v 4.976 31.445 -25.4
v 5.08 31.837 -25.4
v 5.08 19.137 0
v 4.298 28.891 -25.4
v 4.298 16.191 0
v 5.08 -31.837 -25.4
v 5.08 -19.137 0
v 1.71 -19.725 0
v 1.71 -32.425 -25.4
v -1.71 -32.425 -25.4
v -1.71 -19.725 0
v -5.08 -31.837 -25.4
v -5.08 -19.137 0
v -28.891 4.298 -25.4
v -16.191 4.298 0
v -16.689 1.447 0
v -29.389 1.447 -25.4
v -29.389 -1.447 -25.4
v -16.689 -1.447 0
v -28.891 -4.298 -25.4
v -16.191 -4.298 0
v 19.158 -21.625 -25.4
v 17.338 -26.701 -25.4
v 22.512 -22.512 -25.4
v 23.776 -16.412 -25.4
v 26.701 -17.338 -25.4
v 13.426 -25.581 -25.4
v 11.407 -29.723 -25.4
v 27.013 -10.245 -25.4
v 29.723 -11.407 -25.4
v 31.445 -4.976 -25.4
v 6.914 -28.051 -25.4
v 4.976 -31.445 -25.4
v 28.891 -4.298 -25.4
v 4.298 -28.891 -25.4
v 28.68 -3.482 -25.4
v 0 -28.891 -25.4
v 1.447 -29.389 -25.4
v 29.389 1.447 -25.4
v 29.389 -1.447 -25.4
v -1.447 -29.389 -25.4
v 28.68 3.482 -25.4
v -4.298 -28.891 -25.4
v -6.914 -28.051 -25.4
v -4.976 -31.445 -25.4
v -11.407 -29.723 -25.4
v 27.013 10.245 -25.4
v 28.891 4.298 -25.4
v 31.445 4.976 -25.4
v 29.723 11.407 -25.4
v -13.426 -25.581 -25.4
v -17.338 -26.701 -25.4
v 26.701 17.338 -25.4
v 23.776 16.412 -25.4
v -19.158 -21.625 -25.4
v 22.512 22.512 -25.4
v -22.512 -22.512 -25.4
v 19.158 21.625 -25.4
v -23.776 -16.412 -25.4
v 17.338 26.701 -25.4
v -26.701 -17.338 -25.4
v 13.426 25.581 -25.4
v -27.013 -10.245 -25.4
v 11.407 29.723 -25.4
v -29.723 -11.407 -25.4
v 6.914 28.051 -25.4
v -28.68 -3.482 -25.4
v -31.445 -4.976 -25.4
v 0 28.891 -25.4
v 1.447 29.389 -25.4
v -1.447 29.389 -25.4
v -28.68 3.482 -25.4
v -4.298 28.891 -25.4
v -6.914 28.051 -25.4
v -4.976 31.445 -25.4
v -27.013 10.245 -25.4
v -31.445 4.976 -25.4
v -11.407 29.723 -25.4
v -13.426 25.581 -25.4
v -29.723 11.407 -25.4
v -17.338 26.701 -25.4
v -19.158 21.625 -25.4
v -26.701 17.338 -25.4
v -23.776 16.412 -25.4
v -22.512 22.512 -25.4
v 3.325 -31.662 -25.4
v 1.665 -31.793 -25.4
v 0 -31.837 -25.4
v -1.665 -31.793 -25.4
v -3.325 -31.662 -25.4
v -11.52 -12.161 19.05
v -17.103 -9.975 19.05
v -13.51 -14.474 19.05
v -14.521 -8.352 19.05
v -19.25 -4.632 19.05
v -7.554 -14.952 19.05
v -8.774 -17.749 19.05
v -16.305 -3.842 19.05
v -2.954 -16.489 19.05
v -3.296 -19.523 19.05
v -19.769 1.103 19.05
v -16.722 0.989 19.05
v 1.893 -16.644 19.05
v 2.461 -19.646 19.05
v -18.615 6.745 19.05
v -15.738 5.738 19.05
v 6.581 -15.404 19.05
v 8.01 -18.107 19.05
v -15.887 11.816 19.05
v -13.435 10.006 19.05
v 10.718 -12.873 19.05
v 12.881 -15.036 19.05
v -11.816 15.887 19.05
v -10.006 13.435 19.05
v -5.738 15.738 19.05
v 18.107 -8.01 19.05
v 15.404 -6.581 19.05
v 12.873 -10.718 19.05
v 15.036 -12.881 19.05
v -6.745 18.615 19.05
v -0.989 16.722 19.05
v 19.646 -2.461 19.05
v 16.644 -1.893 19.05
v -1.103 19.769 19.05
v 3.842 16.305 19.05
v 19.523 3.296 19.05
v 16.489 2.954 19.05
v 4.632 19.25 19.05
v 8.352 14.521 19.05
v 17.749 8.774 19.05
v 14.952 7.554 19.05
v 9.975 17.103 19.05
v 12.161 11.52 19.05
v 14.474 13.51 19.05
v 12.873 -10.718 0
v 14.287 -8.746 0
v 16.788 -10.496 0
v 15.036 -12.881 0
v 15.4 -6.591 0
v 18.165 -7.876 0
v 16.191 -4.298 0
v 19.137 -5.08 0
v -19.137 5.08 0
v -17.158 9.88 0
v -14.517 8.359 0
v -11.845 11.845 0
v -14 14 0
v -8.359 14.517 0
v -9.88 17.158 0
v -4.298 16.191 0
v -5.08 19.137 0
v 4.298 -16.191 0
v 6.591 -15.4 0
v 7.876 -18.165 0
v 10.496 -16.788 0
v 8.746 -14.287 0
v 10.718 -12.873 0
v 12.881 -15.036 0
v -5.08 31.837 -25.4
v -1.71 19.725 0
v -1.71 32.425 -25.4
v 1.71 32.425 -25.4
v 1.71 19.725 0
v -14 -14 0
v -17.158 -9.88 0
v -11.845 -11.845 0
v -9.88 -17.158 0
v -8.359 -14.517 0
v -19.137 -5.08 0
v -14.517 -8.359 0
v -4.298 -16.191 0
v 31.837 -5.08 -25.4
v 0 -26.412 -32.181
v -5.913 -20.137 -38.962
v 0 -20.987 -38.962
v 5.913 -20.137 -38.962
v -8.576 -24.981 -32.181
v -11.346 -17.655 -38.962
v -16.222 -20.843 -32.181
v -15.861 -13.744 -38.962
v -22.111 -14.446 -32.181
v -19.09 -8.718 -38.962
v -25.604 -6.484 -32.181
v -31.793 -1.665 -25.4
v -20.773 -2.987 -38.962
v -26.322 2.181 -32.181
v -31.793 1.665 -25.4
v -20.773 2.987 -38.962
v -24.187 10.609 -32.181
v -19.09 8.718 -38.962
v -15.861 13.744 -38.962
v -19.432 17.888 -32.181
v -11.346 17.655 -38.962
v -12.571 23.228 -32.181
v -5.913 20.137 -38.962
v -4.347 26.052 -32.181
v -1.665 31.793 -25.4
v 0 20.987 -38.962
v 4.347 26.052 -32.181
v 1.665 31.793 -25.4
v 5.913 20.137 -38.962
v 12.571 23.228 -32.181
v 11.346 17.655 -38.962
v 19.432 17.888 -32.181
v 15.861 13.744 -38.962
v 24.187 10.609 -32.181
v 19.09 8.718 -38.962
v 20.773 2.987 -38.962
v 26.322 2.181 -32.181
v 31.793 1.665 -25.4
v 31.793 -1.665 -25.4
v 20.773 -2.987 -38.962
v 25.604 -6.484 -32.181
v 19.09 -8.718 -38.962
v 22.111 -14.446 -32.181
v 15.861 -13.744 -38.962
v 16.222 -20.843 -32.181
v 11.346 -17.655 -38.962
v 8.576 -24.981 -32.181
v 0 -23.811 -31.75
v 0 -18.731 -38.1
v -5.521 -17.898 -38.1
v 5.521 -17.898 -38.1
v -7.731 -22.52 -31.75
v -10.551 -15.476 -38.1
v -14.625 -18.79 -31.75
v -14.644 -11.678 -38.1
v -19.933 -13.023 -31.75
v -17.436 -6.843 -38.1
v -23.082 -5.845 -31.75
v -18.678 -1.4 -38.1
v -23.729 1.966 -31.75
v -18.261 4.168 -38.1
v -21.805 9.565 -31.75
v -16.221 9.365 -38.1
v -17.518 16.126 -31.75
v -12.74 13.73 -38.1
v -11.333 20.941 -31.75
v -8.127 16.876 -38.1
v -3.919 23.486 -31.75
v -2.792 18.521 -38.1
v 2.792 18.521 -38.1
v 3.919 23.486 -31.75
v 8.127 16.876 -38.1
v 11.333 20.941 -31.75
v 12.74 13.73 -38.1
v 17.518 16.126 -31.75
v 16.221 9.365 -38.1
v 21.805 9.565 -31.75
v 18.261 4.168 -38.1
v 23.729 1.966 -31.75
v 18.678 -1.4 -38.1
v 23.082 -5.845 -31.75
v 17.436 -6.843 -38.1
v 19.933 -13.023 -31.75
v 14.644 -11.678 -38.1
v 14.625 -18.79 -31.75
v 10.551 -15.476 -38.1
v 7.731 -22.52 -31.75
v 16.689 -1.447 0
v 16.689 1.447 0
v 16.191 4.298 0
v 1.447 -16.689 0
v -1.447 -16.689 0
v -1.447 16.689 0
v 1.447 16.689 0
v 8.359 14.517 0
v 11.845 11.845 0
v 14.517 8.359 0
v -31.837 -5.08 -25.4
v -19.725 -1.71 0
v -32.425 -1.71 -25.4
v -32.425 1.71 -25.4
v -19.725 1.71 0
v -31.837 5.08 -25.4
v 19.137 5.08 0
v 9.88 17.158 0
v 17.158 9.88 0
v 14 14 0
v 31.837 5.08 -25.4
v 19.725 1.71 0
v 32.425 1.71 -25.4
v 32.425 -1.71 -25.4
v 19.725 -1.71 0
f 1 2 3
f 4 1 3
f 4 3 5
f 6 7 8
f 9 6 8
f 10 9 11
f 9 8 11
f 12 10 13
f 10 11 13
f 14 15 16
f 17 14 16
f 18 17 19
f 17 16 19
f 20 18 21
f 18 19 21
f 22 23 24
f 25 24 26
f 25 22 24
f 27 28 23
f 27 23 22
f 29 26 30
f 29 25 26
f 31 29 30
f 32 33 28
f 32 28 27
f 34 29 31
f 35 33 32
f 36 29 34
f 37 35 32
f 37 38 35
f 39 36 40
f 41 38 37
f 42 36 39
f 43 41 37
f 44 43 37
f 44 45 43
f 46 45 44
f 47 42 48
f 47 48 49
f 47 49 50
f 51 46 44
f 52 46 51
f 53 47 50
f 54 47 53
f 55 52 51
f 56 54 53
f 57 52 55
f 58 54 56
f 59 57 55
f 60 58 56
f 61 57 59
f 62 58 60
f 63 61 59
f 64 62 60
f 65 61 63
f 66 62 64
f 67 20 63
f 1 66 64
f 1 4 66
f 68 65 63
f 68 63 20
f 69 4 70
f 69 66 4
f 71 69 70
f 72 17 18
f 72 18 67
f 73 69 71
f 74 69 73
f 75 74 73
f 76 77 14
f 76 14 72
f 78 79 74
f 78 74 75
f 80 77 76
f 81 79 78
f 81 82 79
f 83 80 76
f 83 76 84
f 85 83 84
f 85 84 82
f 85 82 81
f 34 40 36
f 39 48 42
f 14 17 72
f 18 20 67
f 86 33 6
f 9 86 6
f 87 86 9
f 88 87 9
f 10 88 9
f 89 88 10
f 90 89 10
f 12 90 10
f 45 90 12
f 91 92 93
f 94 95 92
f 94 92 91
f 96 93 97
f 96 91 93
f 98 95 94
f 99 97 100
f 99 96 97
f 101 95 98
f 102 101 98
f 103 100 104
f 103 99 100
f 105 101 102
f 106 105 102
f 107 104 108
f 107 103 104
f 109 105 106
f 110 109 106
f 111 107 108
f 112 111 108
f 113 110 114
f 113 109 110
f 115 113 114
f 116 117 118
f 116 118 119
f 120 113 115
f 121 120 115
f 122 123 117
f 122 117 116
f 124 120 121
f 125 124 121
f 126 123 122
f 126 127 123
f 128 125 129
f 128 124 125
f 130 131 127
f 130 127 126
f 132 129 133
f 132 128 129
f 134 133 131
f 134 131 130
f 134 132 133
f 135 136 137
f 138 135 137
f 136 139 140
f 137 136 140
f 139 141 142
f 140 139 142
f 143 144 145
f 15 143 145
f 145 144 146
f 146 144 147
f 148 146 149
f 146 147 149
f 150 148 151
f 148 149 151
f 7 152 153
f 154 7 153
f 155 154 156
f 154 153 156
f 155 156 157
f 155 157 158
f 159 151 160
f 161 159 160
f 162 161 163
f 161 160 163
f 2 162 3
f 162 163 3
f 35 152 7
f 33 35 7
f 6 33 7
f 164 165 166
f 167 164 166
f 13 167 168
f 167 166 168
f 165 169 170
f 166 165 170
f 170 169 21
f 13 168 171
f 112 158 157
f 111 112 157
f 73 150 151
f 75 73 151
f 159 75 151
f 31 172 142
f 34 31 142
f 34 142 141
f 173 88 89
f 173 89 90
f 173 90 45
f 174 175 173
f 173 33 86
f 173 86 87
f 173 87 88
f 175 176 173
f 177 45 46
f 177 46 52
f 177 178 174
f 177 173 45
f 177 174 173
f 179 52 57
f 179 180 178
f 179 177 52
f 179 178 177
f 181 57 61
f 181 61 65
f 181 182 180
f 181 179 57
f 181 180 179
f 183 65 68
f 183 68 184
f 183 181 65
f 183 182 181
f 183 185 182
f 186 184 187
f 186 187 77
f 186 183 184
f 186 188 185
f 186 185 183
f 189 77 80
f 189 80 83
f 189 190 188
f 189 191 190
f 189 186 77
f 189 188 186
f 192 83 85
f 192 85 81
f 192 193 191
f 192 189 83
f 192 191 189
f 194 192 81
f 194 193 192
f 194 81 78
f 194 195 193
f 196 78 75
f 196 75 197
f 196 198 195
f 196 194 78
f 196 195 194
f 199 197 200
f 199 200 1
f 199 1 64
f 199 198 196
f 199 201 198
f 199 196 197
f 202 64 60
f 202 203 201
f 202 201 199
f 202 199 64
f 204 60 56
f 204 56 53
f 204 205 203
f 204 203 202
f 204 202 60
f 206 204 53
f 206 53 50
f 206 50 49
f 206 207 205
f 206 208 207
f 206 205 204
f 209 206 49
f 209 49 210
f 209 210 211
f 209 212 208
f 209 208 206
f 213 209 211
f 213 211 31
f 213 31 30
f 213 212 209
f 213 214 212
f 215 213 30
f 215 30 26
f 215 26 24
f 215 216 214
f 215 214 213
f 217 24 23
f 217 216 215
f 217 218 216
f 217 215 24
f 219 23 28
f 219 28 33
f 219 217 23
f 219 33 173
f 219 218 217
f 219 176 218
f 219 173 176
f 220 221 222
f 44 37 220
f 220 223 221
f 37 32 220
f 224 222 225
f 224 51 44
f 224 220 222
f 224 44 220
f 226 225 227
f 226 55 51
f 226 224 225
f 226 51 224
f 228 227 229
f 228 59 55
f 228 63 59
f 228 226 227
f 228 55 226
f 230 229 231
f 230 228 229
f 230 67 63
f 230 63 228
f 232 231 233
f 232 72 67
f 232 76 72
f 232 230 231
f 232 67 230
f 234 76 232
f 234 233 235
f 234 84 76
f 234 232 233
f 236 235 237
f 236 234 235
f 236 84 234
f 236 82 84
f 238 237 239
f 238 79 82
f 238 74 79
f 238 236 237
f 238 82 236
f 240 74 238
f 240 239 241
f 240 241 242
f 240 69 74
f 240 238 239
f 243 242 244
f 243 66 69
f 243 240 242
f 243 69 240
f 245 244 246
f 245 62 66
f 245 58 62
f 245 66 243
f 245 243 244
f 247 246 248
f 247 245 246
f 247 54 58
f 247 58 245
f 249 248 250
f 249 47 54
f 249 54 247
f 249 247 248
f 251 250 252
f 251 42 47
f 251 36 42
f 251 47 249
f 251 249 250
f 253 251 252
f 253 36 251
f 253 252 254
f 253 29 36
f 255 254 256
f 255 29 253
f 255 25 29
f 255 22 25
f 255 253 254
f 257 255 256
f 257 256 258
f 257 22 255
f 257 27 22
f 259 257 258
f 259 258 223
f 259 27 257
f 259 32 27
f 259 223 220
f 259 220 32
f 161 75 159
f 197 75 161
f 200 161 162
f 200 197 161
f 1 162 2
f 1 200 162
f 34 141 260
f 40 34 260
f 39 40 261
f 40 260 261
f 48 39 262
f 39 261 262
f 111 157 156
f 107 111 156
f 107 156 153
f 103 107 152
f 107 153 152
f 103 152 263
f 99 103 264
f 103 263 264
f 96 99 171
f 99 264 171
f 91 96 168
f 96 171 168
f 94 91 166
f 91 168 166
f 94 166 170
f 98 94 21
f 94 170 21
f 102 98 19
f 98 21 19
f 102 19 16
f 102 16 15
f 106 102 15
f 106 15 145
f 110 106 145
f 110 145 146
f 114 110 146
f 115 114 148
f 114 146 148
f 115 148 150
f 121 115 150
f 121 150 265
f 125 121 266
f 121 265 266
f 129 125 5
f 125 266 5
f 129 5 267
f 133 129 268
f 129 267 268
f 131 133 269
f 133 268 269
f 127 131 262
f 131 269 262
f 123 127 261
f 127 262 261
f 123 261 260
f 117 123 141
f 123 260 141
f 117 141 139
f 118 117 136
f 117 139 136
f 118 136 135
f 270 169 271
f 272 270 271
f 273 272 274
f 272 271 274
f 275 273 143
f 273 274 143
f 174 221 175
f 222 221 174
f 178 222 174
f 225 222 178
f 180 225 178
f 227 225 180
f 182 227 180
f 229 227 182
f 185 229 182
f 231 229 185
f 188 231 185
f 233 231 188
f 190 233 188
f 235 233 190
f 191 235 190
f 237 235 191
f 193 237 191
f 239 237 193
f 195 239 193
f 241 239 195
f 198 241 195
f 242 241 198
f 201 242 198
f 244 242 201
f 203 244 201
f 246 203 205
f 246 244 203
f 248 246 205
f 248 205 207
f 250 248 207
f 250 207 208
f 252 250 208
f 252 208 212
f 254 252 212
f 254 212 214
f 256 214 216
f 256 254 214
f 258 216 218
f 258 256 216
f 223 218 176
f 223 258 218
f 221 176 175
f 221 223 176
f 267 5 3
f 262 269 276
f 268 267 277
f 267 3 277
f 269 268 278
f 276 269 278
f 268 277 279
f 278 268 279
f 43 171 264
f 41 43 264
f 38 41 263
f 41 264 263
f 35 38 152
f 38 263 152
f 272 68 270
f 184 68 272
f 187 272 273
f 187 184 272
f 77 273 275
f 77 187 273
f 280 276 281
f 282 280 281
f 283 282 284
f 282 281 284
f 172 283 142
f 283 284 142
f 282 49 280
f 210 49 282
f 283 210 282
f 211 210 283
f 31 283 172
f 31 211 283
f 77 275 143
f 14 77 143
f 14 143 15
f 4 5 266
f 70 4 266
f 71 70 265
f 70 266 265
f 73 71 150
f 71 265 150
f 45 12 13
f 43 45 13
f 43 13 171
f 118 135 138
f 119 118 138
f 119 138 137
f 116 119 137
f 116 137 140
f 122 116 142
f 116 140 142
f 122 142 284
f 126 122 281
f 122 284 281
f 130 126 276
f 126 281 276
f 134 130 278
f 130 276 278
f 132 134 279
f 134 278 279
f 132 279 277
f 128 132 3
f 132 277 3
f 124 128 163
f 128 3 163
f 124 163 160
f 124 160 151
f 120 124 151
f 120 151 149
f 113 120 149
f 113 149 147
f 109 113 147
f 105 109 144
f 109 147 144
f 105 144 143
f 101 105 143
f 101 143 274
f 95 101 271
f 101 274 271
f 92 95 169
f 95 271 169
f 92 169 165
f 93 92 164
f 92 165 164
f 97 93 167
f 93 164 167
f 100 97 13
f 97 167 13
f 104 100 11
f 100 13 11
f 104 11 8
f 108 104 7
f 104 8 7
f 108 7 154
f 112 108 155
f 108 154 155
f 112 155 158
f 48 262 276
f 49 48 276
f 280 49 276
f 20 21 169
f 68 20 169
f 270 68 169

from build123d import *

# Parameters (mm, degrees)
F1_DEPTH        = 19.05
F4_COPIES_COUNT = 4


# Not quite as in the source:
# - a pattern or mirror of a feature is missing from the dataset's text; its kind, count and spacing are read off the source's solid


with BuildPart() as f1:
    # F0 (on Top) → F1 (new body)
    with BuildSketch(Plane.XY):
        with BuildLine():
            ThreePointArc((10.71820488, -12.8734663491), (-11.8449578237, 11.8449578237), (12.8734663491, -10.71820488))
            Line((12.8734663491, -10.71820488), (15.0363144921, -12.8810530231))
            ThreePointArc((15.0363144921, -12.8810530231), (-14.0002192927, 14.0002192927), (12.8810530231, -15.0363144921))
            Line((12.8810530231, -15.0363144921), (10.71820488, -12.8734663491))
        make_face()
    extrude(amount=F1_DEPTH)

    # F4: sweep along a path in F3
    with BuildLine(Plane.YZ) as f4_path:
        Line((-32.4993, -25.4), (-19.7993, 0))
    # F2 (on face) → F4 (sweep)
    with BuildSketch(Plane(origin=(0, 0, 0), x_dir=(1, 0, 0), z_dir=(0, 0, -1))):
        with BuildLine():
            ThreePointArc((5.08, 19.136506486), (0, 19.7993), (-5.08, 19.136506486))
            Line((-5.08, 19.136506486), (-4.2979602309, 16.1905401251))
            ThreePointArc((-4.2979602309, 16.1905401251), (0, 16.7513), (4.2979602309, 16.1905401251))
            Line((4.2979602309, 16.1905401251), (5.08, 19.136506486))
        make_face()
    f4 = sweep(path=f4_path.line)

    # F4_copies: F4 ×4 about axis
    f4_copies_axis = Axis((0, 0, 0), (0, 0, 1))
    for i in range(1, F4_COPIES_COUNT):
        add(f4.rotate(f4_copies_axis, i * 360 / F4_COPIES_COUNT))

    # F7 (on Right) → F8 (revolve)
    with BuildSketch(Plane.YZ):
        Polygon((-18.7305401251, -38.1), (-28.8905401251, -25.4), (-31.836506486, -25.4), (-20.986948621, -38.9619473312), align=None)
    revolve(axis=Axis((0, 0, -16.1163), (0, 0, -1)))


solid = f1.part
